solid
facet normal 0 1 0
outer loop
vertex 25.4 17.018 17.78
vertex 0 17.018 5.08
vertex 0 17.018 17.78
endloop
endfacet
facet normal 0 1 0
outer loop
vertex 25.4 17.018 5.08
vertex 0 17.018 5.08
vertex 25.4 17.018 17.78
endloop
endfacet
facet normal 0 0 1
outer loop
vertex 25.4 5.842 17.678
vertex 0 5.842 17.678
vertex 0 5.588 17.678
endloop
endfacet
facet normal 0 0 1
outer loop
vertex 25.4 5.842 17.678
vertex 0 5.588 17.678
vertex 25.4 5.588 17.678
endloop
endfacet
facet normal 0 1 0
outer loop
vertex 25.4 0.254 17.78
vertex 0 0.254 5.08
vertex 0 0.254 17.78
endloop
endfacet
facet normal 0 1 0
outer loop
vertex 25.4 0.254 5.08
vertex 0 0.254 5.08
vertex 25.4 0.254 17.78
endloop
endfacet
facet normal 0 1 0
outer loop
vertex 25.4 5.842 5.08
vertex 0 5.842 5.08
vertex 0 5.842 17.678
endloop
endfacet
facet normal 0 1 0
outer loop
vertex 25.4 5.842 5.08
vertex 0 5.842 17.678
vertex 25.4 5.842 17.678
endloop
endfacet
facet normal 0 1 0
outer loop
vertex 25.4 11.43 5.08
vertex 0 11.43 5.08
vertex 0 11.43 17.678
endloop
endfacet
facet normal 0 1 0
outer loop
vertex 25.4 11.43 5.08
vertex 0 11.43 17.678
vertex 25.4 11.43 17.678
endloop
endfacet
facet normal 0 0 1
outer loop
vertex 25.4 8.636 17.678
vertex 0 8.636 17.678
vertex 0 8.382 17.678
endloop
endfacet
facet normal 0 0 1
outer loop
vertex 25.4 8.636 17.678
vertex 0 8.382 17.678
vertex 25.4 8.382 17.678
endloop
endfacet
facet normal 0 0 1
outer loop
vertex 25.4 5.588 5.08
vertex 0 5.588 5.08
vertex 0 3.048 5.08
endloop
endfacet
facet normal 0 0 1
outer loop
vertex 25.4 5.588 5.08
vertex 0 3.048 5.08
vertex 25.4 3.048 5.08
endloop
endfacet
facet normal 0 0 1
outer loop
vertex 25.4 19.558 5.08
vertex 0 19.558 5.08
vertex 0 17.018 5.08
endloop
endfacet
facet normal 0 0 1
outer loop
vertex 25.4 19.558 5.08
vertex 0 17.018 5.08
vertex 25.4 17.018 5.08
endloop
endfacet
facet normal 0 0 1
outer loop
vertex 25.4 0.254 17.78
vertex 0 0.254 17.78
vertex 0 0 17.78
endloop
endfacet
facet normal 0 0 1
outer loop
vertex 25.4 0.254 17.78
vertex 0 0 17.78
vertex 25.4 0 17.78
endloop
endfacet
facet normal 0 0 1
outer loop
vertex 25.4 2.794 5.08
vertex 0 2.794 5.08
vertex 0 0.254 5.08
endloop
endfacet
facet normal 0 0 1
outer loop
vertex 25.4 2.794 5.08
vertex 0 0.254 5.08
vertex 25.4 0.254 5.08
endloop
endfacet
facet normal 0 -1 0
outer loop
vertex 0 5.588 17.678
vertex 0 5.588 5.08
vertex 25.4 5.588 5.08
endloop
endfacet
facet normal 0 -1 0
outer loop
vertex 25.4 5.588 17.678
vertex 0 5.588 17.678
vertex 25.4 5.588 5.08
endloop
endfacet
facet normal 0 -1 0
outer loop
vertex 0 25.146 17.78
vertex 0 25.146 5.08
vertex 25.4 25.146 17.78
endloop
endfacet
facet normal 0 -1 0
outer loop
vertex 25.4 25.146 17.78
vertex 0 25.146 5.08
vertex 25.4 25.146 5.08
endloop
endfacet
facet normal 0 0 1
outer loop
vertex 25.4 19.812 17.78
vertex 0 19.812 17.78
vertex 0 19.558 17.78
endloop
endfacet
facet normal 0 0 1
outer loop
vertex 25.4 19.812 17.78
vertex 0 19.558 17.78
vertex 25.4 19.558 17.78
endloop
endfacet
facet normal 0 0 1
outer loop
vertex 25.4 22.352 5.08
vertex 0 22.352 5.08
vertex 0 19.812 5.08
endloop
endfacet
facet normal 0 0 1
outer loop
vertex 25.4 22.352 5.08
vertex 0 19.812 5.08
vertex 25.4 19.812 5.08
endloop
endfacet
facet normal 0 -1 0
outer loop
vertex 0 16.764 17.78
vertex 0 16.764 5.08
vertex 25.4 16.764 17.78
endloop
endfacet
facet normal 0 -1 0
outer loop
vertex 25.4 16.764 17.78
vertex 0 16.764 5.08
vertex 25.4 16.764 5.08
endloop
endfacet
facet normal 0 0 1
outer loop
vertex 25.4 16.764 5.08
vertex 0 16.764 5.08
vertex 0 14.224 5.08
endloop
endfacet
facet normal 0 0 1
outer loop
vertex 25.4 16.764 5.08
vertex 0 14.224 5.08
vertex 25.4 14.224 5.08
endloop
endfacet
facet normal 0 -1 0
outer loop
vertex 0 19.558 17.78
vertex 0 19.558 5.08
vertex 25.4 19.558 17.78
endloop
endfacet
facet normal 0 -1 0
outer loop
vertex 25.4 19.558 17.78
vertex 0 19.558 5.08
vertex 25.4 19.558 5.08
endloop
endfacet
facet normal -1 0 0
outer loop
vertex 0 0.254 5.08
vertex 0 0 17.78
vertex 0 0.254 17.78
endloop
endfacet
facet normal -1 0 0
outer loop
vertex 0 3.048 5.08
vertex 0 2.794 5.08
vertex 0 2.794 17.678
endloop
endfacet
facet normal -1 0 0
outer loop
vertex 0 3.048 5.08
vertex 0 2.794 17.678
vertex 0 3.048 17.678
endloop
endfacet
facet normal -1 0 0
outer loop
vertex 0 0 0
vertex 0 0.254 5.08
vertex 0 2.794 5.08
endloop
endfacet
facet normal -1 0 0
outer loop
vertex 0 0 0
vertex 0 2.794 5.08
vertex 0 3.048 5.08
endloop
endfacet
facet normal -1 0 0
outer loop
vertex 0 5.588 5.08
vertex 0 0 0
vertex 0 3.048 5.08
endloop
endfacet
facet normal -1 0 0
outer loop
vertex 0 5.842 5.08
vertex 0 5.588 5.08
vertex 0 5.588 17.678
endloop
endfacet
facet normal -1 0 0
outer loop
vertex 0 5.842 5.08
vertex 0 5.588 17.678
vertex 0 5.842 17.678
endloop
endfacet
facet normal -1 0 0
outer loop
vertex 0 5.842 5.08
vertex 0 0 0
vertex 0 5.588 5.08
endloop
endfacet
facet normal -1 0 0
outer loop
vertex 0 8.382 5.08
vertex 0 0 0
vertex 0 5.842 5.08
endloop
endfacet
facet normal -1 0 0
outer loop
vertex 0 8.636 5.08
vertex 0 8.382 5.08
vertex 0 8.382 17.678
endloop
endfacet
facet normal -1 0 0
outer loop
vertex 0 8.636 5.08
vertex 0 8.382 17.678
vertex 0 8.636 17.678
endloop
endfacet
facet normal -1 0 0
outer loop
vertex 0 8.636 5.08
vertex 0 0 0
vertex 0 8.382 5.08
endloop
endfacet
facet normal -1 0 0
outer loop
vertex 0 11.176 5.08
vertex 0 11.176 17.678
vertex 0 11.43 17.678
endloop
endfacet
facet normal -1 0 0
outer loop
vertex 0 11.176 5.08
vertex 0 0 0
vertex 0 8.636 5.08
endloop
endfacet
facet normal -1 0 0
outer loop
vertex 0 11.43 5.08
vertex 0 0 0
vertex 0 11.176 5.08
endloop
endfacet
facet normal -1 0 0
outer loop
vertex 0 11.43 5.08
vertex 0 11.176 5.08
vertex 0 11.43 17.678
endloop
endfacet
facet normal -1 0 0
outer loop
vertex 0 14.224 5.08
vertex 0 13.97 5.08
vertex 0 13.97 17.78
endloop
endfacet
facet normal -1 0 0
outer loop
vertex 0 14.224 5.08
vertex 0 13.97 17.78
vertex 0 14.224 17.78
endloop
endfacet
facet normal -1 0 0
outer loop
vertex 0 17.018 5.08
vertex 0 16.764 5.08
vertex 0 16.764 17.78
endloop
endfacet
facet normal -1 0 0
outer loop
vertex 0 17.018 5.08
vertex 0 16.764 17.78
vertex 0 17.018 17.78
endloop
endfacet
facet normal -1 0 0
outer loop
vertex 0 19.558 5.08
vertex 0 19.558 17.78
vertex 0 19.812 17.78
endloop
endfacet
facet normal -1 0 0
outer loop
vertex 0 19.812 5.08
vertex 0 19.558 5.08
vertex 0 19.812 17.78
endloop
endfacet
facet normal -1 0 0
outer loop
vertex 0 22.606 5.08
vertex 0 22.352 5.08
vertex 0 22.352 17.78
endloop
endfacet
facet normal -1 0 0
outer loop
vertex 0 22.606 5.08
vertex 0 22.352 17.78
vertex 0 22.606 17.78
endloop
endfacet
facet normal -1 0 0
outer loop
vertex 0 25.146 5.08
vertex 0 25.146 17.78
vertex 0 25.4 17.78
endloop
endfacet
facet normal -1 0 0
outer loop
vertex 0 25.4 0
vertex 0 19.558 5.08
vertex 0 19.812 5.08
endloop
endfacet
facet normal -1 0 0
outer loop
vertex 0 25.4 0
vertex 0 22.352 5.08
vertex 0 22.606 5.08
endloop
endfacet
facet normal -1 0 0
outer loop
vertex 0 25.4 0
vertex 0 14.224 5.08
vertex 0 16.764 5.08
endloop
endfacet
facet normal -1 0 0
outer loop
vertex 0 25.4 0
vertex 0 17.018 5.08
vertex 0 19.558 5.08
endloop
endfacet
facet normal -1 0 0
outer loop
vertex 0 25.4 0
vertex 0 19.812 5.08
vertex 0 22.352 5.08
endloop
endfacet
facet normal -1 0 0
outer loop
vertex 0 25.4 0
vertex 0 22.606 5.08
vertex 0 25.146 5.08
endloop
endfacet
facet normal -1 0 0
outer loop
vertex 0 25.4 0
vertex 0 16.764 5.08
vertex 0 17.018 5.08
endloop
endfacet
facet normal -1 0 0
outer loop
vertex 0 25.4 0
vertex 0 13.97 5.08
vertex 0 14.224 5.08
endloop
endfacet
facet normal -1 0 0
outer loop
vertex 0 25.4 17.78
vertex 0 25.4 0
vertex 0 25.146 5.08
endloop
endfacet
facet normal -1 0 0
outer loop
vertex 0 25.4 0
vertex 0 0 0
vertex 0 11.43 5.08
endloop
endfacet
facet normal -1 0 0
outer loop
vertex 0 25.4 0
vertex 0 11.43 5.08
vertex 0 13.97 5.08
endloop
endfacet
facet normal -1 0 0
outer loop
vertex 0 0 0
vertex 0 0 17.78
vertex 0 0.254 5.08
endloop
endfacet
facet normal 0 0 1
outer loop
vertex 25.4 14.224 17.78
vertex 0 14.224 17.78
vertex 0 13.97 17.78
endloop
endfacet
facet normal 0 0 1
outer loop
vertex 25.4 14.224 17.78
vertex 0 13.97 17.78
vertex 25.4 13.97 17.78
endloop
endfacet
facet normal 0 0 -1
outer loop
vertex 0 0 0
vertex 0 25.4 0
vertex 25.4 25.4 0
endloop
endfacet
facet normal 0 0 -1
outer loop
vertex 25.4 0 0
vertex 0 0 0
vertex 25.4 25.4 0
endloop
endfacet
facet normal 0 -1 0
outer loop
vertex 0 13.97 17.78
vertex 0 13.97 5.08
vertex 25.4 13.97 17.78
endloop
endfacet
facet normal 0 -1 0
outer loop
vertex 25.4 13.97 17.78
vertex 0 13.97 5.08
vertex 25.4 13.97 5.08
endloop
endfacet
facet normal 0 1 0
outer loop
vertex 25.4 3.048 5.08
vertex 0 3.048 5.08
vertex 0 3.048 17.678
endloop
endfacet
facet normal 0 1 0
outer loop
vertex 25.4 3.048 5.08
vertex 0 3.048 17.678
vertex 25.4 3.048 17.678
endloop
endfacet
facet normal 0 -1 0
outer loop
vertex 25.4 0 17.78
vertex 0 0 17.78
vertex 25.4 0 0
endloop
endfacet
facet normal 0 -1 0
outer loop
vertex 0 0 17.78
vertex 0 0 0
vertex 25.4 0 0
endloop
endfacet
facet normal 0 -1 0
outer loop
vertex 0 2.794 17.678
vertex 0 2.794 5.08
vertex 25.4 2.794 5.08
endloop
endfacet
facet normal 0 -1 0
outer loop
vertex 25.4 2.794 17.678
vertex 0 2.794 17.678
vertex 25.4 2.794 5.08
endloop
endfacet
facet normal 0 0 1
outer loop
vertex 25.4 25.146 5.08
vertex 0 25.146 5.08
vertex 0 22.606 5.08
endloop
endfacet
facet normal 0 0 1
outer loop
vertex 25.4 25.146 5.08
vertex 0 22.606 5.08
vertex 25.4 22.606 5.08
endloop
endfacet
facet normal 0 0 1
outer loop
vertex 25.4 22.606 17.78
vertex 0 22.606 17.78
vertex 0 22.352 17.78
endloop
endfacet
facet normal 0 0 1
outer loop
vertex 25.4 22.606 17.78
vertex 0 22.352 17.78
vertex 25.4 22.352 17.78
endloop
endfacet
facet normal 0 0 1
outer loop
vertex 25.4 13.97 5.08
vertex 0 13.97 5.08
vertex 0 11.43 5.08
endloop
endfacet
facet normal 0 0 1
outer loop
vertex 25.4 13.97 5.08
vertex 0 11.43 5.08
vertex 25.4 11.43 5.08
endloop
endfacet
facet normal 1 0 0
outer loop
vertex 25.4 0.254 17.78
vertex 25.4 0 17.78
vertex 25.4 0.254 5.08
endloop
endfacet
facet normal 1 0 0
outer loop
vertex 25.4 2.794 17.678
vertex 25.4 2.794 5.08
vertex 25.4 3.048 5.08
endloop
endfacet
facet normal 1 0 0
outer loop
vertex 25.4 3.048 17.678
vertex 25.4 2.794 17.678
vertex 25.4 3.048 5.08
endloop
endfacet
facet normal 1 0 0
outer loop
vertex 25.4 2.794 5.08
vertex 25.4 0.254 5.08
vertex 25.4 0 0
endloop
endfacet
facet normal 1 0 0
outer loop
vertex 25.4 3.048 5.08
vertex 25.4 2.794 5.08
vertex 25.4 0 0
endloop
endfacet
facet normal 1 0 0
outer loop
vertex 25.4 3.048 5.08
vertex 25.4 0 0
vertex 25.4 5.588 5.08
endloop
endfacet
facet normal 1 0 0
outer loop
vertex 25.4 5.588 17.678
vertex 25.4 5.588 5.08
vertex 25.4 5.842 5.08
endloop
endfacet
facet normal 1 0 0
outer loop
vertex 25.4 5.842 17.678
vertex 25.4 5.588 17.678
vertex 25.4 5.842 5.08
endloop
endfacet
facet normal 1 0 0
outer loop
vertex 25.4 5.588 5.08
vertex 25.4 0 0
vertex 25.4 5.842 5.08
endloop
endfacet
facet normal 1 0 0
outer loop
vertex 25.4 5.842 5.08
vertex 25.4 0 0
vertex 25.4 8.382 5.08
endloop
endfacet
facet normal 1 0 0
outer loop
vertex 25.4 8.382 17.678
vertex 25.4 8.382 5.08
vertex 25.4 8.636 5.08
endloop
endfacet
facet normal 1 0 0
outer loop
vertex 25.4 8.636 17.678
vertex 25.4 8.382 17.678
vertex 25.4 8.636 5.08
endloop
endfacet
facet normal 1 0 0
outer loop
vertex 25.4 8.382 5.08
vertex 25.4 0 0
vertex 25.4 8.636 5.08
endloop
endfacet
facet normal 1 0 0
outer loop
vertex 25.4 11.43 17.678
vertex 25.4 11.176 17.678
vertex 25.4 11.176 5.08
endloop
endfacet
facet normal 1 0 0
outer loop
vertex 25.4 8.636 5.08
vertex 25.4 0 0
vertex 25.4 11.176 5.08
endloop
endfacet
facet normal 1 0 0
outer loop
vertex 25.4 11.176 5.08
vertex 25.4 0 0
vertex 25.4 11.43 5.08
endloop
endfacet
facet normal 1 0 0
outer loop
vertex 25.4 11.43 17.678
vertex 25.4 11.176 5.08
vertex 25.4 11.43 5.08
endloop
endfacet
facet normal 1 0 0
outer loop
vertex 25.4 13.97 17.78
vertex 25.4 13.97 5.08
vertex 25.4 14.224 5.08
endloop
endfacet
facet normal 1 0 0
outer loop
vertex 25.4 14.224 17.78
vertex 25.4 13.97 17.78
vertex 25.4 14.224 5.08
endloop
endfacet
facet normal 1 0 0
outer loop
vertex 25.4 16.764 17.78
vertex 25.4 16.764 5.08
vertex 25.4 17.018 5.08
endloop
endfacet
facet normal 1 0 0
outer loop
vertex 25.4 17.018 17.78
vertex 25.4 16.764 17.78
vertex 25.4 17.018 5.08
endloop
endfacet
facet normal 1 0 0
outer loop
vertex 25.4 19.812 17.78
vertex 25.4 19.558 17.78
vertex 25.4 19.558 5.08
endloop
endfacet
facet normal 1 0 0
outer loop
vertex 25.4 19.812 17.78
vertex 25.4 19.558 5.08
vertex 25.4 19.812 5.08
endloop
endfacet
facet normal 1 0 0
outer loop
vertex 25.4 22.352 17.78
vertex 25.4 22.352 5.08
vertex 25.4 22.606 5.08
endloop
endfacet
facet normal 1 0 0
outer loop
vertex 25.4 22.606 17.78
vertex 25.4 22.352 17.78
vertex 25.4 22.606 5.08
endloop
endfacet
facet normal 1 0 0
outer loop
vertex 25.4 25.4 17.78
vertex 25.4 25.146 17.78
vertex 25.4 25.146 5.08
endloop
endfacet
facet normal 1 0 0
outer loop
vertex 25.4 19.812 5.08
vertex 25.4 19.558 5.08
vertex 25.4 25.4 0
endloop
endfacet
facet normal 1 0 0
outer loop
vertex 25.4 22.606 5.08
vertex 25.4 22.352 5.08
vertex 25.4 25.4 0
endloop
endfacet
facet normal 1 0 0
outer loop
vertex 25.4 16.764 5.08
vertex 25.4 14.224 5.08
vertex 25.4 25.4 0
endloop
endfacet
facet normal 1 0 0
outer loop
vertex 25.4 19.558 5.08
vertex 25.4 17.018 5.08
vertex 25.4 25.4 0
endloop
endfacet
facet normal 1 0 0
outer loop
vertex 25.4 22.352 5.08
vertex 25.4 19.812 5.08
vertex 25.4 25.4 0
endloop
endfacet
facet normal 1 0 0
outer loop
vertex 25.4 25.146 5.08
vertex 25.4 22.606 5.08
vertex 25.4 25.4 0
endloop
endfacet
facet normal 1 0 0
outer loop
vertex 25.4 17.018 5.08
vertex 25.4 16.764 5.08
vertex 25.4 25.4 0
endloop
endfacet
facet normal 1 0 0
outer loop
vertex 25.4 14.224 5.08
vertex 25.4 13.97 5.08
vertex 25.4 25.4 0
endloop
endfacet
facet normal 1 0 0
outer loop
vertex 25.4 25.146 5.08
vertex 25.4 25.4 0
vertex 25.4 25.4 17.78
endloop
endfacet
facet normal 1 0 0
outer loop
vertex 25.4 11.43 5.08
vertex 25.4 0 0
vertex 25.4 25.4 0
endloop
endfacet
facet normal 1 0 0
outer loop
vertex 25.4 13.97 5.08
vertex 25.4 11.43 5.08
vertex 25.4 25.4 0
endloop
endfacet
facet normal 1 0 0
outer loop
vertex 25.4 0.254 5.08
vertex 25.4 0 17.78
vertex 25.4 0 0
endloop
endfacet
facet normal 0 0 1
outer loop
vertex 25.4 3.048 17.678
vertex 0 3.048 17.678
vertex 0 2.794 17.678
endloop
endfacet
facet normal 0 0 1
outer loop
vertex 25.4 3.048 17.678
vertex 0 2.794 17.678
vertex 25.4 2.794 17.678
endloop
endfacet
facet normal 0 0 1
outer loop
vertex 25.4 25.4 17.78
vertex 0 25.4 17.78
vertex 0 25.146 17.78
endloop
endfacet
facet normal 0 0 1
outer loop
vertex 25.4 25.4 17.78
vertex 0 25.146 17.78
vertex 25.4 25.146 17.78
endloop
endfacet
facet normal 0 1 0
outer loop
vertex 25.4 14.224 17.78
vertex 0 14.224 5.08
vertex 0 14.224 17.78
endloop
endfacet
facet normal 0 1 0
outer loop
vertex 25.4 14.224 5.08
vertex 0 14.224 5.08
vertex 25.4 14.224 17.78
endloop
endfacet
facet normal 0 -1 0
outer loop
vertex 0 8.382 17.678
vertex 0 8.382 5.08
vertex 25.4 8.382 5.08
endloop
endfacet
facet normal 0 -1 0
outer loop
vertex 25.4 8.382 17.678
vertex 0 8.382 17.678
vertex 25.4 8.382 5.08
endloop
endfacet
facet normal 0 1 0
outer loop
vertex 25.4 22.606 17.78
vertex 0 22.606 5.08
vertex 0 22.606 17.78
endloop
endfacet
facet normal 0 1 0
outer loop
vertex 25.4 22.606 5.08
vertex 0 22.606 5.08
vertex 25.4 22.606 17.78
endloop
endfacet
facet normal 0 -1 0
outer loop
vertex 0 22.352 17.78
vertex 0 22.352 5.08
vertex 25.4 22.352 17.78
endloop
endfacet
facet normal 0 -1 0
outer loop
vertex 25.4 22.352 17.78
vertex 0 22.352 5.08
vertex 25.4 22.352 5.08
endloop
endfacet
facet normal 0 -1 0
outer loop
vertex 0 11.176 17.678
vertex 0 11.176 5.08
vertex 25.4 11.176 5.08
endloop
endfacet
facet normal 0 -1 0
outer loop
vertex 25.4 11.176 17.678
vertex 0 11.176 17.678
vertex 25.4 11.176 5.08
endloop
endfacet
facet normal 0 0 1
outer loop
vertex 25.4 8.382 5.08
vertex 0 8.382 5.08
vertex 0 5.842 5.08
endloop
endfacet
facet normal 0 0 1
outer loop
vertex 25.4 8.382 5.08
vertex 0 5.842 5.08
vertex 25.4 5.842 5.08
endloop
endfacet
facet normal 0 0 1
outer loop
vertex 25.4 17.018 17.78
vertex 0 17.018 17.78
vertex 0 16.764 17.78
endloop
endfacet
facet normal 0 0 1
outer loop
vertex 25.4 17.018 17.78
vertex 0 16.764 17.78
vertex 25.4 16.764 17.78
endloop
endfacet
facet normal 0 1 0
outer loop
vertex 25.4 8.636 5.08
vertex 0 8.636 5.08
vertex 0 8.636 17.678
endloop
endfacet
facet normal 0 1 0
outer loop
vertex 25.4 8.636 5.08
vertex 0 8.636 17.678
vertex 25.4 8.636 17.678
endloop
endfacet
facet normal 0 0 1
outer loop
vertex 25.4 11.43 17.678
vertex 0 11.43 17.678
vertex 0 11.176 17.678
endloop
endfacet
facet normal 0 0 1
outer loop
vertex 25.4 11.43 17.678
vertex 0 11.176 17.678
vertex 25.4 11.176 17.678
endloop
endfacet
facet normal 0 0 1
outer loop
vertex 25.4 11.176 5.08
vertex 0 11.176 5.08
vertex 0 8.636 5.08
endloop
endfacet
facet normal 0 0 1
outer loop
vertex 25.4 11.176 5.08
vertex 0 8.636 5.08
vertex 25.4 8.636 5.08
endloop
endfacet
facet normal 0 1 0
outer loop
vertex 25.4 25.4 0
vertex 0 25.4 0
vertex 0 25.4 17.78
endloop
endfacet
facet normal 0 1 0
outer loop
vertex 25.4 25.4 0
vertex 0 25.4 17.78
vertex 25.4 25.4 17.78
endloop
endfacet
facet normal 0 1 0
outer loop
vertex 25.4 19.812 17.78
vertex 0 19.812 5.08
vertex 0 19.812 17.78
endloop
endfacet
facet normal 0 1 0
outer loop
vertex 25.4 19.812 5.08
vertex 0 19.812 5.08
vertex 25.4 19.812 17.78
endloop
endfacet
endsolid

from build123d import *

# Parameters (mm, degrees)
SKETCH2_W           = 25.4
SKETCH2_H           = 25.4
BOSS_EXTRUDE1_DEPTH = 5.08
SKETCH3_W           = 25.4
SKETCH3_H           = 0.254
BOSS_EXTRUDE2_DEPTH = 12.7
SKETCH6_W           = 25.4
SKETCH6_H           = 0.254
BOSS_EXTRUDE3_DEPTH = 12.5984
SKETCH5_W           = 25.4
SKETCH5_H           = 0.254
BOSS_EXTRUDE4_DEPTH = 12.7
SKETCH4_W           = 25.4
SKETCH4_H           = 0.254
BOSS_EXTRUDE5_DEPTH = 12.7


with BuildPart() as part:
    # Sketch2 → Boss-Extrude1 (new body)
    with BuildSketch(Plane.XY):
        with Locations((12.7, 12.7)):
            Rectangle(SKETCH2_W, SKETCH2_H)
    extrude(amount=BOSS_EXTRUDE1_DEPTH)

    # Sketch3 → Boss-Extrude2 (add)
    with BuildSketch(Plane.XY.offset(5.08)):
        with Locations((12.7, 25.273)):
            Rectangle(SKETCH3_W, SKETCH3_H)
    extrude(amount=BOSS_EXTRUDE2_DEPTH)

    # Sketch6 → Boss-Extrude3 (add)
    with BuildSketch(Plane.XY.offset(5.08)):
        with Locations((12.7, 11.303)):
            Rectangle(SKETCH6_W, SKETCH6_H)
        with Locations((12.7, 8.509)):
            Rectangle(SKETCH6_W, SKETCH6_H)
        with Locations((12.7, 5.715)):
            Rectangle(SKETCH6_W, SKETCH6_H)
        with Locations((12.7, 2.921)):
            Rectangle(SKETCH6_W, SKETCH6_H)
    extrude(amount=BOSS_EXTRUDE3_DEPTH)

    # Sketch5 → Boss-Extrude4 (add)
    with BuildSketch(Plane.XY.offset(5.08)):
        with Locations((12.7, 19.685)):
            Rectangle(SKETCH5_W, SKETCH5_H)
        with Locations((12.7, 16.891)):
            Rectangle(SKETCH5_W, SKETCH5_H)
        with Locations((12.7, 14.097)):
            Rectangle(SKETCH5_W, SKETCH5_H)
    extrude(amount=BOSS_EXTRUDE4_DEPTH)

    # Sketch4 → Boss-Extrude5 (add)
    with BuildSketch(Plane.XY.offset(5.08)):
        with Locations((12.7, 0.127)):
            Rectangle(SKETCH4_W, SKETCH4_H)
        with Locations((12.7, 22.479)):
            Rectangle(SKETCH4_W, SKETCH4_H)
    extrude(amount=BOSS_EXTRUDE5_DEPTH)


solid = part.part
